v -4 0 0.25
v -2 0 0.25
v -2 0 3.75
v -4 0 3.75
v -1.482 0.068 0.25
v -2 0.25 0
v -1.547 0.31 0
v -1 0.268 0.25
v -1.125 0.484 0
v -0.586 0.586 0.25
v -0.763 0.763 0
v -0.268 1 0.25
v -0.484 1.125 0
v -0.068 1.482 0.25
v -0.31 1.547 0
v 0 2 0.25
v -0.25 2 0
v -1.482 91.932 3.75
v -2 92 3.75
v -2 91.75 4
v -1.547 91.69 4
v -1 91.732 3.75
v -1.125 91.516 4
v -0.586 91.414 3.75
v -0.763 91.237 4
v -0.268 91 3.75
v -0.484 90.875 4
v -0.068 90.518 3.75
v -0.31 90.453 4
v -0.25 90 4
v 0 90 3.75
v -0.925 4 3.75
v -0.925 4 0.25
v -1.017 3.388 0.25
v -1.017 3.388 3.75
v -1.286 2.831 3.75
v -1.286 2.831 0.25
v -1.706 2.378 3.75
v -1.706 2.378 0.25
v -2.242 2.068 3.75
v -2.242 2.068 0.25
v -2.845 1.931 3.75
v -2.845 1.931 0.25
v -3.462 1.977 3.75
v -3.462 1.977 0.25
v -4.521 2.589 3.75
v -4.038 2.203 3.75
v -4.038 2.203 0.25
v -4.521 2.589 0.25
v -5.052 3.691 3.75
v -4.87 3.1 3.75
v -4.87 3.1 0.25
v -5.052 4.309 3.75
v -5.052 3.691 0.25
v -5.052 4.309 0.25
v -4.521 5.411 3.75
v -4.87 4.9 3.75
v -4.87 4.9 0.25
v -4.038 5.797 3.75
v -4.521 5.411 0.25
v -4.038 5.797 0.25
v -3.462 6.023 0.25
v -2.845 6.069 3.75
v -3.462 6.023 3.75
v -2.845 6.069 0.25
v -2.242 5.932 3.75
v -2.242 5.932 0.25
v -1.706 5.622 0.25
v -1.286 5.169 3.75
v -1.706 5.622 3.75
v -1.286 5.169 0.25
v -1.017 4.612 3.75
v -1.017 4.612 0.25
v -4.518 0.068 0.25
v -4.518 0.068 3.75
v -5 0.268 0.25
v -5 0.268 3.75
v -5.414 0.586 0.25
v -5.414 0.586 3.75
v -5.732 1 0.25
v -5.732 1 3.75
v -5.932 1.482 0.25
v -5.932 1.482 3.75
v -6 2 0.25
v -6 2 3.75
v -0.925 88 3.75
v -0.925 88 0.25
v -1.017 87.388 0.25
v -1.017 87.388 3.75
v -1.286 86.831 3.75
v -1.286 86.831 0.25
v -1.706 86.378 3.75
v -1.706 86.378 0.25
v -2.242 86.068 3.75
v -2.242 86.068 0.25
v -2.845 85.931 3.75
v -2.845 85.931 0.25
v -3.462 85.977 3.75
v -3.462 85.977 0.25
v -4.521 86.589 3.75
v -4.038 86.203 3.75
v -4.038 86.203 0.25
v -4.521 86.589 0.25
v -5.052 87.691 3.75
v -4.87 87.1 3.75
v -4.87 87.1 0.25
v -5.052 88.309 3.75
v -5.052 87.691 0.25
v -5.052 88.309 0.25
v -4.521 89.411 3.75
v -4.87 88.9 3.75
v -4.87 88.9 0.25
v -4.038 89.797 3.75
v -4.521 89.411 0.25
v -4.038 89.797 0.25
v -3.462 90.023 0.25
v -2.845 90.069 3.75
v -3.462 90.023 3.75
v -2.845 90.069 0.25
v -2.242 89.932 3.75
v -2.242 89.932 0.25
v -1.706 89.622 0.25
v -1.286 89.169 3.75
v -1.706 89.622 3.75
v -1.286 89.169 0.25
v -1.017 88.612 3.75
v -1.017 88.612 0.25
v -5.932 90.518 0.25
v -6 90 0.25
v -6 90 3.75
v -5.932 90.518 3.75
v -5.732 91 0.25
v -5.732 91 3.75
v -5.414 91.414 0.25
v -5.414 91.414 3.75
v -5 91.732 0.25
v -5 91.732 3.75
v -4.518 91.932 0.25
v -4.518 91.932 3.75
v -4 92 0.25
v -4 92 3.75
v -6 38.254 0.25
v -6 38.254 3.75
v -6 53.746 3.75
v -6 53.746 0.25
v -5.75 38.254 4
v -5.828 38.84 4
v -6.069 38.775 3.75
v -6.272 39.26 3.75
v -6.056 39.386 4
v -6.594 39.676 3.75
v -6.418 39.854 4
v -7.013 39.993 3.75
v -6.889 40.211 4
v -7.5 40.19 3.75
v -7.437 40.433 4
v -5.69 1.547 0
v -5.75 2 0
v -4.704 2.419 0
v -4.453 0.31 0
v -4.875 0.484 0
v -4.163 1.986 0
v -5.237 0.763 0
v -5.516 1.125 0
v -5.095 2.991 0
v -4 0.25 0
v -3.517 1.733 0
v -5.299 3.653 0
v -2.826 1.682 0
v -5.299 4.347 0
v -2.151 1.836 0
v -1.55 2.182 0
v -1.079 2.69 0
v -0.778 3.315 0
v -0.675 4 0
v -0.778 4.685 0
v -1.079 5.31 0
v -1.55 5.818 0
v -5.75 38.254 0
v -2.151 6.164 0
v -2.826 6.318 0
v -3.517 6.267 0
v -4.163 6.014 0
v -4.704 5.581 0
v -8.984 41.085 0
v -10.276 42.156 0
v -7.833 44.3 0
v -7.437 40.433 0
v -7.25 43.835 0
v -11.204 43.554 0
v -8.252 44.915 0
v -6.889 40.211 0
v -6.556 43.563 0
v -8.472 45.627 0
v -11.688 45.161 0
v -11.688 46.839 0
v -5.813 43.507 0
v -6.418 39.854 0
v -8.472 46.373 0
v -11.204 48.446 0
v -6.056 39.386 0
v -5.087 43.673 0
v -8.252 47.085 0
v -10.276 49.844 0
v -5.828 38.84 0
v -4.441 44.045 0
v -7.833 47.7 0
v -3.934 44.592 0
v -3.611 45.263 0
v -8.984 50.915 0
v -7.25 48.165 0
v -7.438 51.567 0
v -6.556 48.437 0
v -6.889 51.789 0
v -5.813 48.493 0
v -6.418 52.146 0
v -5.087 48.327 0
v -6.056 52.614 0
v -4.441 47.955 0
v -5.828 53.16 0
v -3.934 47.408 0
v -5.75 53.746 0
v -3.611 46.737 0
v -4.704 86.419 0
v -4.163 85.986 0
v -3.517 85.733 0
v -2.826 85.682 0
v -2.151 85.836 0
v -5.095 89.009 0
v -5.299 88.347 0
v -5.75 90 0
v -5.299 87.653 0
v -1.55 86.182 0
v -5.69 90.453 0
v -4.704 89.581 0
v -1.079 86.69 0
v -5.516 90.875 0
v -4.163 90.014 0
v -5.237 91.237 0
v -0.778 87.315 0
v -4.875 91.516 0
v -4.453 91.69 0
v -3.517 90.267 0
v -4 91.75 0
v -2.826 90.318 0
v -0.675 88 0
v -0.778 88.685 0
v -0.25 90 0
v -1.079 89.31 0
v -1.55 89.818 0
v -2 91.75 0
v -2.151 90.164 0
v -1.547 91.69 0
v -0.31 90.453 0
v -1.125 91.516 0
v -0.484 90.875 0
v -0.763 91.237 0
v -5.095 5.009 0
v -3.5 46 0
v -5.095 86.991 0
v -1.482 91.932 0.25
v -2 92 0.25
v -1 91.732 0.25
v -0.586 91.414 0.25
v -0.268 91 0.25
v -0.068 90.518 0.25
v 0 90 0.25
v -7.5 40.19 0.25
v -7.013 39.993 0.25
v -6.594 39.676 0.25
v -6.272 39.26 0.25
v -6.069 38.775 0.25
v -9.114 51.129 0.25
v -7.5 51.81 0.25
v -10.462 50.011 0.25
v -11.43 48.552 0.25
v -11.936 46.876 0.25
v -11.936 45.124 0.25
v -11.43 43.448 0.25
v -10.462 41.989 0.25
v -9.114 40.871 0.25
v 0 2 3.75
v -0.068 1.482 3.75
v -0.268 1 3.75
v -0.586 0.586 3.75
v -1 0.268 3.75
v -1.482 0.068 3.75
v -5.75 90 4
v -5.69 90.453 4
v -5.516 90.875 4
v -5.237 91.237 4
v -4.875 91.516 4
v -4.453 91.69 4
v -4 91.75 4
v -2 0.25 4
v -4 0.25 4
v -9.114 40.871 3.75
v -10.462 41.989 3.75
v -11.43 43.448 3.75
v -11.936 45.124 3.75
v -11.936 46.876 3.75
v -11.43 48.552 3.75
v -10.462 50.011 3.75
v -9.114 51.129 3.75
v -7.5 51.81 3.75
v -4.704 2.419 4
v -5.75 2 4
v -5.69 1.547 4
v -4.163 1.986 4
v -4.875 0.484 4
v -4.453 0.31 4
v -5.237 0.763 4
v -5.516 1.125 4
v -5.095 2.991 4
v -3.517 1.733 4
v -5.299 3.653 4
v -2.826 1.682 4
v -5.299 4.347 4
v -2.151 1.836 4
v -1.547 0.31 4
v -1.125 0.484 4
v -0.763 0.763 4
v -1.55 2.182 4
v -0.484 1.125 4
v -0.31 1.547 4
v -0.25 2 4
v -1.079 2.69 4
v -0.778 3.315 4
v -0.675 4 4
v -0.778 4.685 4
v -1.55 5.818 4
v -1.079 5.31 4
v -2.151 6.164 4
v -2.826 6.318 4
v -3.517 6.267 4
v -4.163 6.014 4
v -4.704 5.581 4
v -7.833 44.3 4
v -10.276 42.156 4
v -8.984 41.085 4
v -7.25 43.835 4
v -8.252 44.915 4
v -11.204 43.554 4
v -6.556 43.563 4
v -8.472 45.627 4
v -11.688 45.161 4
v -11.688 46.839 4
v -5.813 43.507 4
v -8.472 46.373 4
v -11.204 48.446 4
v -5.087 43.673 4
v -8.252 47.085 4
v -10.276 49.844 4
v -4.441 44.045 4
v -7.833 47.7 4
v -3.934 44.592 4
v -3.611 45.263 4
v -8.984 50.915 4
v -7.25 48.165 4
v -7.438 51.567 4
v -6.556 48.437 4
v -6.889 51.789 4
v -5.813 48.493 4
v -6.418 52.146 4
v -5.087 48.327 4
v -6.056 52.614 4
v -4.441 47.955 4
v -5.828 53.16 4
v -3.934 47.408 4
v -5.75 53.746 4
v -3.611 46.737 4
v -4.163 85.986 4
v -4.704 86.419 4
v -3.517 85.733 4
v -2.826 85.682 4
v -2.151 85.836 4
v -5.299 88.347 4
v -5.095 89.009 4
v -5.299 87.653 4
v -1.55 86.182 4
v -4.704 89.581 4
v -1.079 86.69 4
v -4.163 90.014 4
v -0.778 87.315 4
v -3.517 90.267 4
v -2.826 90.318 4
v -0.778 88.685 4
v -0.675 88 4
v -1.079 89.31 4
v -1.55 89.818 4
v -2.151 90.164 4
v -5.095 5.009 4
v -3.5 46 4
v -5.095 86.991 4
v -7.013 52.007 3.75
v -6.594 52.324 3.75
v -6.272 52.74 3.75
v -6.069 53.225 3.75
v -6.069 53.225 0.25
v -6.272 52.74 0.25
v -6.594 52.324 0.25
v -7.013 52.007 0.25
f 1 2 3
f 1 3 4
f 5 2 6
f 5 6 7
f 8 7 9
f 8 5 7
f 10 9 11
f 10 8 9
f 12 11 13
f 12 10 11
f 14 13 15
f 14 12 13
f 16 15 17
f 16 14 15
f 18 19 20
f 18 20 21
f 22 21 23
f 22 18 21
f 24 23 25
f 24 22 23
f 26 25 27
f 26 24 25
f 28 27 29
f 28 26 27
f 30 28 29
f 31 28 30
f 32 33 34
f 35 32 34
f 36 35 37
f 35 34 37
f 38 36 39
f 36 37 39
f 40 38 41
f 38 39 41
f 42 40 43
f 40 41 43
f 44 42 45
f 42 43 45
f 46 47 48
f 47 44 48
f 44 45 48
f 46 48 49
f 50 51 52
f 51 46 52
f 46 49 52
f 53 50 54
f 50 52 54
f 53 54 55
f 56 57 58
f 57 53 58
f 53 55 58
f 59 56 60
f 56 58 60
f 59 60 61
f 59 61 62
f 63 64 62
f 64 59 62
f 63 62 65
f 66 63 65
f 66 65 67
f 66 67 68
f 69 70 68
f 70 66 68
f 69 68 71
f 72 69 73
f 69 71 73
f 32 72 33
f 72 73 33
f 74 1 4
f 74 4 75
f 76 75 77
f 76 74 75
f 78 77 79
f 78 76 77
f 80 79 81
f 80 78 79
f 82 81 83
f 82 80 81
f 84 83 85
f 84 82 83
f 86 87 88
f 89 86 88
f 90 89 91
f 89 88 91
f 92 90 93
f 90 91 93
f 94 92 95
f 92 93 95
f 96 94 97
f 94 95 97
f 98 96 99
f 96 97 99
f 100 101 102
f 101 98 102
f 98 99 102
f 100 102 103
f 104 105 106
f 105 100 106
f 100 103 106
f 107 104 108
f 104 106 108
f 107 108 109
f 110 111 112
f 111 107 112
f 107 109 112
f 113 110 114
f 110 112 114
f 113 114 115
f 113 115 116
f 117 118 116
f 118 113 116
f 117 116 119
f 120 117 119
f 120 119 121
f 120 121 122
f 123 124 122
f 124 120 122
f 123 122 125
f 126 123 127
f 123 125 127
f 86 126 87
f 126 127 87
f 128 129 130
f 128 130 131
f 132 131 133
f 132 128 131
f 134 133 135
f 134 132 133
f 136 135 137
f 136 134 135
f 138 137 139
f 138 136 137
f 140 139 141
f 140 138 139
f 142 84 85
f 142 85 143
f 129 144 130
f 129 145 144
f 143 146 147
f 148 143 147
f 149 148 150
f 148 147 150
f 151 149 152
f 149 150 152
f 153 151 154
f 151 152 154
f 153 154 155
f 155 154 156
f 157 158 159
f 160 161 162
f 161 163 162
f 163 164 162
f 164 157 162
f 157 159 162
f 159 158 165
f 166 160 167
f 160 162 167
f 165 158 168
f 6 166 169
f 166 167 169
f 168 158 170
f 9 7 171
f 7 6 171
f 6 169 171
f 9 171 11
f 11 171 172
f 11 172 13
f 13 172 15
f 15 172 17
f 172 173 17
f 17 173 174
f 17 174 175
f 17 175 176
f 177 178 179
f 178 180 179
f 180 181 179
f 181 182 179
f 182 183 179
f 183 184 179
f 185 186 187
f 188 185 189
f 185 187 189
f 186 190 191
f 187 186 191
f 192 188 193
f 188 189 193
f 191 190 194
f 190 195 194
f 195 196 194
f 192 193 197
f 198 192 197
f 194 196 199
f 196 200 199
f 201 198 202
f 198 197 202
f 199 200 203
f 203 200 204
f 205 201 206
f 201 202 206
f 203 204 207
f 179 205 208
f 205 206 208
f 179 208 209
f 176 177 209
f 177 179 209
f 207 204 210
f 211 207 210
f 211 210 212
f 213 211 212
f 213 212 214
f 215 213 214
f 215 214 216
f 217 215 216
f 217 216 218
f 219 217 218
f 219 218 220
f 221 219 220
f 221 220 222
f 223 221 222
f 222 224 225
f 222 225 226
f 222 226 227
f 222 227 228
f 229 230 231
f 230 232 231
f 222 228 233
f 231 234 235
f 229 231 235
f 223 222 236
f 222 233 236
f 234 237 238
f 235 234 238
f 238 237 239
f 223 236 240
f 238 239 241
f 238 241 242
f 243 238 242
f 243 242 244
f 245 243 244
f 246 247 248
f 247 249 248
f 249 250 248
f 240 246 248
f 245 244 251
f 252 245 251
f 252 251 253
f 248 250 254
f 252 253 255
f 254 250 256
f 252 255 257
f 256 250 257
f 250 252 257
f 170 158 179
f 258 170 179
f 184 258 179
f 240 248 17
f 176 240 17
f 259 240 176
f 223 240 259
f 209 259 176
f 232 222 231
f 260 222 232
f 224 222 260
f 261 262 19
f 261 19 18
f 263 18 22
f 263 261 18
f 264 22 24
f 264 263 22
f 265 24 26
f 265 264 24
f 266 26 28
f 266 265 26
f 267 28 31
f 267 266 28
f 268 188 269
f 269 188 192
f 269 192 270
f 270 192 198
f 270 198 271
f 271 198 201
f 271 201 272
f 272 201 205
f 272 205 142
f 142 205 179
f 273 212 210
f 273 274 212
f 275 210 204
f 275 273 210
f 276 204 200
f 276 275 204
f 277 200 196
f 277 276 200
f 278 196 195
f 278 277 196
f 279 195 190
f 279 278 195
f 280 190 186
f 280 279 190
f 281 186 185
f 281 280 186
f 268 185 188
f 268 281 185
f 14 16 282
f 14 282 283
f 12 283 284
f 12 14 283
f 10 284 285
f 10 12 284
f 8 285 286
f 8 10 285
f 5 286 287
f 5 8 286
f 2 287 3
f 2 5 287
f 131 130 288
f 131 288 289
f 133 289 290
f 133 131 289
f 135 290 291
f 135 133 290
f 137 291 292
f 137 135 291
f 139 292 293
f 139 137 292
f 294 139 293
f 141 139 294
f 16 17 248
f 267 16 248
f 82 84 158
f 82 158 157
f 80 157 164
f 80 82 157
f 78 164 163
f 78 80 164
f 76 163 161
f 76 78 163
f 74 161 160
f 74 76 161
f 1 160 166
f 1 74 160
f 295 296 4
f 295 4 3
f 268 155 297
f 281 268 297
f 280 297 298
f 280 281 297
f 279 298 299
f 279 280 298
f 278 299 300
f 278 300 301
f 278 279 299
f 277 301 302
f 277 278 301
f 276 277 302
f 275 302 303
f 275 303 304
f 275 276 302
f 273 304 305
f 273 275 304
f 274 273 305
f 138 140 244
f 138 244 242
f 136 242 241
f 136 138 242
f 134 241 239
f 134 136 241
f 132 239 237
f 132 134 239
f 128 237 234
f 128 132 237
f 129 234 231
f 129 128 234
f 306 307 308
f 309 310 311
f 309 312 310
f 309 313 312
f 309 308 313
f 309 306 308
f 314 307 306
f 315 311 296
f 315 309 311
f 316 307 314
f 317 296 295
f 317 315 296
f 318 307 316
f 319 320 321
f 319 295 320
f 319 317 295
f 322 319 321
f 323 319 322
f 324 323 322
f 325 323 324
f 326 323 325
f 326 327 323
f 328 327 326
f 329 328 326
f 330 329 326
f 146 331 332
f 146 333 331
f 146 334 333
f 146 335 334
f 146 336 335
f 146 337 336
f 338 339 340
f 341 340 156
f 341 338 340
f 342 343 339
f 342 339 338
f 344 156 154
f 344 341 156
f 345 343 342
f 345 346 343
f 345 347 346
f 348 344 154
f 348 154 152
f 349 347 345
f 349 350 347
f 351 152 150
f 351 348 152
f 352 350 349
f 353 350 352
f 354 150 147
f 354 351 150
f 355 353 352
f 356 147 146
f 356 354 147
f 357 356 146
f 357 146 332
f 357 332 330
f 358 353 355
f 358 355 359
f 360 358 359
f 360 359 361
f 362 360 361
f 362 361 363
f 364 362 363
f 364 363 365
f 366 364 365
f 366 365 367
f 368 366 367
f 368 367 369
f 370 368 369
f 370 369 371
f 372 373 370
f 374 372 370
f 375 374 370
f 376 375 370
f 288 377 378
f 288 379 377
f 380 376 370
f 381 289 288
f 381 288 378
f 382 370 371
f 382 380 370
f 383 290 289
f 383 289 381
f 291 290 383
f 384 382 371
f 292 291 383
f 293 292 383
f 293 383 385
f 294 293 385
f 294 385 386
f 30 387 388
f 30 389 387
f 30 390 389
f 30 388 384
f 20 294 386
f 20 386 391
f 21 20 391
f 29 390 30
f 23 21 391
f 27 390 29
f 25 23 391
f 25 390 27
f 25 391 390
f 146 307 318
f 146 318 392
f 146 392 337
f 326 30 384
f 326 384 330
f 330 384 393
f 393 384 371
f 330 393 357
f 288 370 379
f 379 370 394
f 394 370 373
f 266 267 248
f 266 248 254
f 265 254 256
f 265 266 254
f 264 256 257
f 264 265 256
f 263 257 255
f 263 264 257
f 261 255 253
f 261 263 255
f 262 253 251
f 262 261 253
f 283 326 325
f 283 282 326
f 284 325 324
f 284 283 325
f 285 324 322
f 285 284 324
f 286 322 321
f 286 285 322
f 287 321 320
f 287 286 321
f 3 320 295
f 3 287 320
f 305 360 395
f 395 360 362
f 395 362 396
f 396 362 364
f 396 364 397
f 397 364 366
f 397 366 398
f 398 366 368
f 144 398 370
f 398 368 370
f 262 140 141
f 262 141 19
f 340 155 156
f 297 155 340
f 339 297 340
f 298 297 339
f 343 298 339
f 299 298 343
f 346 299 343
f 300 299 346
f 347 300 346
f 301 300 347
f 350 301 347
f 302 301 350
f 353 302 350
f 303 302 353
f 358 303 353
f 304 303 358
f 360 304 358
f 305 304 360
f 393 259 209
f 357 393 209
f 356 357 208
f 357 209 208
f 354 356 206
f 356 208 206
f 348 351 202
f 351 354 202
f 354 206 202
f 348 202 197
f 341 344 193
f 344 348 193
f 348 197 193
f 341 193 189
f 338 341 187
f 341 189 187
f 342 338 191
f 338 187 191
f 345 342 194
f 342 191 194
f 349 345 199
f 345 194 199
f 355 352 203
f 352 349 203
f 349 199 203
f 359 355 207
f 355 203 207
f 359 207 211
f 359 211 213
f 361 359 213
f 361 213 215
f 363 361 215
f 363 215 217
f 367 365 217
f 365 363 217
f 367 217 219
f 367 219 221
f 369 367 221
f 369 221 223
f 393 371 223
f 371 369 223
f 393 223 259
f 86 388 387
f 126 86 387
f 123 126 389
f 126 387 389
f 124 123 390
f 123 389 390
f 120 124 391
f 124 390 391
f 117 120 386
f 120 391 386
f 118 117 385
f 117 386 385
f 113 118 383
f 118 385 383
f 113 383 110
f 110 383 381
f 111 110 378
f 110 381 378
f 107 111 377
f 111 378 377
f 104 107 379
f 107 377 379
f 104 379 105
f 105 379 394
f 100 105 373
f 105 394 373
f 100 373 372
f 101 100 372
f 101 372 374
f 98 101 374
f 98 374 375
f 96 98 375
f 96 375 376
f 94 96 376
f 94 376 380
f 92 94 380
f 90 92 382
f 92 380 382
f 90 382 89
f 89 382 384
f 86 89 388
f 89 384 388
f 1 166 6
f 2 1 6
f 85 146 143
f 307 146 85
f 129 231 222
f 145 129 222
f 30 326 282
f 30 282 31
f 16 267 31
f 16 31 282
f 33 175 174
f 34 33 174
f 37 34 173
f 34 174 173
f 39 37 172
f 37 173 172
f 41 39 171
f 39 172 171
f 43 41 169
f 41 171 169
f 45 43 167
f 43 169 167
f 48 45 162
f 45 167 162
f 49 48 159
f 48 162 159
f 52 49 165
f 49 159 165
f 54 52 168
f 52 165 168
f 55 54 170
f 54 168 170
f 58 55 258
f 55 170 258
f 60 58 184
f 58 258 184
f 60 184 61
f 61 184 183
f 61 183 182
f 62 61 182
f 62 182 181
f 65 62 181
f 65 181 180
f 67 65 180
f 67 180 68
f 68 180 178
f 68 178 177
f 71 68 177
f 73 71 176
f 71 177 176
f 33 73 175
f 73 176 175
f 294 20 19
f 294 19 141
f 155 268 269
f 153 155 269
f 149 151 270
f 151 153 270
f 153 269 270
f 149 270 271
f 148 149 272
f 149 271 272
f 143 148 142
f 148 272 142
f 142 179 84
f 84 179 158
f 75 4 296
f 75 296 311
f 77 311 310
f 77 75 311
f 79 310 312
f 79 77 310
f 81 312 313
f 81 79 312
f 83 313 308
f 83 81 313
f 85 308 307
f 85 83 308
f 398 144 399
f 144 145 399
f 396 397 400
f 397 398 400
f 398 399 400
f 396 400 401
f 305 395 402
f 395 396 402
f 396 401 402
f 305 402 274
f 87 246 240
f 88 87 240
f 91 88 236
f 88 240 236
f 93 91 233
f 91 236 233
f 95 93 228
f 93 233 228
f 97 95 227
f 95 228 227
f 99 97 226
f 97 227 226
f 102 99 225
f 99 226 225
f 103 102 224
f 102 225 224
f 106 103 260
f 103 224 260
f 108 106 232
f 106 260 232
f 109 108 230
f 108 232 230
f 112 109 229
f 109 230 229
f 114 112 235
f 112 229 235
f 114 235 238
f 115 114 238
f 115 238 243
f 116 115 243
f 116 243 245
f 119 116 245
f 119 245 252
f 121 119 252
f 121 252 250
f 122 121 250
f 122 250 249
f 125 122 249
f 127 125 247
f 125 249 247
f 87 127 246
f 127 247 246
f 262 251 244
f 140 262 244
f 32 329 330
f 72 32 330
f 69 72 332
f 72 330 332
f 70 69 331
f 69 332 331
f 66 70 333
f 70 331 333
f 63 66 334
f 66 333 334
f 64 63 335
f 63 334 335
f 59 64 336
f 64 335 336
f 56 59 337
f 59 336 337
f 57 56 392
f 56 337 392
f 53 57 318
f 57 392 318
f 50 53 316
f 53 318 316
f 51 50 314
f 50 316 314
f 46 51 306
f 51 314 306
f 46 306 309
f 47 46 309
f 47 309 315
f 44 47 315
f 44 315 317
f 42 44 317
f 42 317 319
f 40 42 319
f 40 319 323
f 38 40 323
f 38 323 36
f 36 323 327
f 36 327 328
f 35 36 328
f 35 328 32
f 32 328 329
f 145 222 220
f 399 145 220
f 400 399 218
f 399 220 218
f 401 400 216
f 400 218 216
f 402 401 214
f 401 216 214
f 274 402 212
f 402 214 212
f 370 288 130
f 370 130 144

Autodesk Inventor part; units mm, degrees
ref_plane "YZ Plane" through (0, 0, 0) normal (1, 0, 0) x (0, 1, 0)
ref_plane "XZ Plane" through (0, 0, 0) normal (0, 1, 0) x (-1, 0, 0)
ref_plane "XY Plane" through (0, 0, 0) normal (0, 0, 1) x (1, 0, 0)
sketch "Sketch1" plane through (0, 0, 0) normal (0, 0, 1) x (1, 0, 0)
  line L0 (-2, 0) -> (-4, 0)
  line L1 (-4, 92) -> (-2, 92)
  line L2 (0, 90) -> (0, 2)
  circle A0 centre (-3, 4) radius 2.075
  circle A1 centre (-3, 88) radius 2.075
  arc A2 (-4, 92) -> (-6, 90) centre (-4, 90) ccw
  arc A3 (0, 90) -> (-2, 92) centre (-2, 90) ccw
  arc A4 (-2, 0) -> (0, 2) centre (-2, 2) ccw
  arc A5 (-6, 2) -> (-4, 0) centre (-4, 2) ccw
  arc A6 (-7.5, 51.8095) -> (-7.5, 40.1905) centre (-6, 46) ccw
  circle A7 centre (-6, 46) radius 2.5
  line L3 (-6, 53.746) -> (-6, 90)
  line L4 (-6, 2) -> (-6, 38.254)
  arc A8 (-7.5, 51.8095) -> (-6, 53.746) centre (-8, 53.746) ccw
  arc A9 (-6, 38.254) -> (-7.5, 40.1905) centre (-8, 38.254) ccw
  point P0 (0, 0)
  point P1 (-6, 92)
  point P2 (-6, 0)
  point P3 (0, 92)
  point P4 (-3, 92)
  point P5 (-6, 52)
  point P6 (-6, 40)
  dimension "d0" = 6
  dimension "d1" = 92
  dimension "d2" = 4.15
  dimension "d3" = 4.15
  dimension "d4" = 84
  dimension "d5" = 4
  dimension "d6" = 2
  dimension "d12" = 12
  dimension "d13" = 5
  dimension "d14" = 2
extrude "Extrusion1" add sketch "Sketch1" along normal blind 4
chamfer "Chamfer1" distance 0.25 angle 45 28 edges at (-5.075, 88, 4) (-5.075, 88, 0) (-3, 92, 0) (-5.4142, 91.4142, 0) (-6, 71.873, 0) (-6.4189, 52.5212, 0) (-12, 46, 0) (-6.4189, 39.4788, 0) (-6, 20.127, 0) (-5.4142, 0.5858, 0) (-3, 0, 0) (-0.5858, 0.5858, 0) (0, 46, 0) (-0.5858, 91.4142, 0) (-3, 92, 4) (-5.4142, 91.4142, 4) (-6, 71.873, 4) (-6.4189, 52.5212, 4) (-12, 46, 4) (-6.4189, 39.4788, 4) (-6, 20.127, 4) (-5.4142, 0.5858, 4) (-3, 0, 4) (-0.5858, 0.5858, 4) (0, 46, 4) (-0.5858, 91.4142, 4) (-5.075, 4, 4) (-5.075, 4, 0)
equation "\"d3\" = d2"
equation "\"d5\" = -0.5 * d4 + 0.5 * d1"
properties part number "Spacer"
